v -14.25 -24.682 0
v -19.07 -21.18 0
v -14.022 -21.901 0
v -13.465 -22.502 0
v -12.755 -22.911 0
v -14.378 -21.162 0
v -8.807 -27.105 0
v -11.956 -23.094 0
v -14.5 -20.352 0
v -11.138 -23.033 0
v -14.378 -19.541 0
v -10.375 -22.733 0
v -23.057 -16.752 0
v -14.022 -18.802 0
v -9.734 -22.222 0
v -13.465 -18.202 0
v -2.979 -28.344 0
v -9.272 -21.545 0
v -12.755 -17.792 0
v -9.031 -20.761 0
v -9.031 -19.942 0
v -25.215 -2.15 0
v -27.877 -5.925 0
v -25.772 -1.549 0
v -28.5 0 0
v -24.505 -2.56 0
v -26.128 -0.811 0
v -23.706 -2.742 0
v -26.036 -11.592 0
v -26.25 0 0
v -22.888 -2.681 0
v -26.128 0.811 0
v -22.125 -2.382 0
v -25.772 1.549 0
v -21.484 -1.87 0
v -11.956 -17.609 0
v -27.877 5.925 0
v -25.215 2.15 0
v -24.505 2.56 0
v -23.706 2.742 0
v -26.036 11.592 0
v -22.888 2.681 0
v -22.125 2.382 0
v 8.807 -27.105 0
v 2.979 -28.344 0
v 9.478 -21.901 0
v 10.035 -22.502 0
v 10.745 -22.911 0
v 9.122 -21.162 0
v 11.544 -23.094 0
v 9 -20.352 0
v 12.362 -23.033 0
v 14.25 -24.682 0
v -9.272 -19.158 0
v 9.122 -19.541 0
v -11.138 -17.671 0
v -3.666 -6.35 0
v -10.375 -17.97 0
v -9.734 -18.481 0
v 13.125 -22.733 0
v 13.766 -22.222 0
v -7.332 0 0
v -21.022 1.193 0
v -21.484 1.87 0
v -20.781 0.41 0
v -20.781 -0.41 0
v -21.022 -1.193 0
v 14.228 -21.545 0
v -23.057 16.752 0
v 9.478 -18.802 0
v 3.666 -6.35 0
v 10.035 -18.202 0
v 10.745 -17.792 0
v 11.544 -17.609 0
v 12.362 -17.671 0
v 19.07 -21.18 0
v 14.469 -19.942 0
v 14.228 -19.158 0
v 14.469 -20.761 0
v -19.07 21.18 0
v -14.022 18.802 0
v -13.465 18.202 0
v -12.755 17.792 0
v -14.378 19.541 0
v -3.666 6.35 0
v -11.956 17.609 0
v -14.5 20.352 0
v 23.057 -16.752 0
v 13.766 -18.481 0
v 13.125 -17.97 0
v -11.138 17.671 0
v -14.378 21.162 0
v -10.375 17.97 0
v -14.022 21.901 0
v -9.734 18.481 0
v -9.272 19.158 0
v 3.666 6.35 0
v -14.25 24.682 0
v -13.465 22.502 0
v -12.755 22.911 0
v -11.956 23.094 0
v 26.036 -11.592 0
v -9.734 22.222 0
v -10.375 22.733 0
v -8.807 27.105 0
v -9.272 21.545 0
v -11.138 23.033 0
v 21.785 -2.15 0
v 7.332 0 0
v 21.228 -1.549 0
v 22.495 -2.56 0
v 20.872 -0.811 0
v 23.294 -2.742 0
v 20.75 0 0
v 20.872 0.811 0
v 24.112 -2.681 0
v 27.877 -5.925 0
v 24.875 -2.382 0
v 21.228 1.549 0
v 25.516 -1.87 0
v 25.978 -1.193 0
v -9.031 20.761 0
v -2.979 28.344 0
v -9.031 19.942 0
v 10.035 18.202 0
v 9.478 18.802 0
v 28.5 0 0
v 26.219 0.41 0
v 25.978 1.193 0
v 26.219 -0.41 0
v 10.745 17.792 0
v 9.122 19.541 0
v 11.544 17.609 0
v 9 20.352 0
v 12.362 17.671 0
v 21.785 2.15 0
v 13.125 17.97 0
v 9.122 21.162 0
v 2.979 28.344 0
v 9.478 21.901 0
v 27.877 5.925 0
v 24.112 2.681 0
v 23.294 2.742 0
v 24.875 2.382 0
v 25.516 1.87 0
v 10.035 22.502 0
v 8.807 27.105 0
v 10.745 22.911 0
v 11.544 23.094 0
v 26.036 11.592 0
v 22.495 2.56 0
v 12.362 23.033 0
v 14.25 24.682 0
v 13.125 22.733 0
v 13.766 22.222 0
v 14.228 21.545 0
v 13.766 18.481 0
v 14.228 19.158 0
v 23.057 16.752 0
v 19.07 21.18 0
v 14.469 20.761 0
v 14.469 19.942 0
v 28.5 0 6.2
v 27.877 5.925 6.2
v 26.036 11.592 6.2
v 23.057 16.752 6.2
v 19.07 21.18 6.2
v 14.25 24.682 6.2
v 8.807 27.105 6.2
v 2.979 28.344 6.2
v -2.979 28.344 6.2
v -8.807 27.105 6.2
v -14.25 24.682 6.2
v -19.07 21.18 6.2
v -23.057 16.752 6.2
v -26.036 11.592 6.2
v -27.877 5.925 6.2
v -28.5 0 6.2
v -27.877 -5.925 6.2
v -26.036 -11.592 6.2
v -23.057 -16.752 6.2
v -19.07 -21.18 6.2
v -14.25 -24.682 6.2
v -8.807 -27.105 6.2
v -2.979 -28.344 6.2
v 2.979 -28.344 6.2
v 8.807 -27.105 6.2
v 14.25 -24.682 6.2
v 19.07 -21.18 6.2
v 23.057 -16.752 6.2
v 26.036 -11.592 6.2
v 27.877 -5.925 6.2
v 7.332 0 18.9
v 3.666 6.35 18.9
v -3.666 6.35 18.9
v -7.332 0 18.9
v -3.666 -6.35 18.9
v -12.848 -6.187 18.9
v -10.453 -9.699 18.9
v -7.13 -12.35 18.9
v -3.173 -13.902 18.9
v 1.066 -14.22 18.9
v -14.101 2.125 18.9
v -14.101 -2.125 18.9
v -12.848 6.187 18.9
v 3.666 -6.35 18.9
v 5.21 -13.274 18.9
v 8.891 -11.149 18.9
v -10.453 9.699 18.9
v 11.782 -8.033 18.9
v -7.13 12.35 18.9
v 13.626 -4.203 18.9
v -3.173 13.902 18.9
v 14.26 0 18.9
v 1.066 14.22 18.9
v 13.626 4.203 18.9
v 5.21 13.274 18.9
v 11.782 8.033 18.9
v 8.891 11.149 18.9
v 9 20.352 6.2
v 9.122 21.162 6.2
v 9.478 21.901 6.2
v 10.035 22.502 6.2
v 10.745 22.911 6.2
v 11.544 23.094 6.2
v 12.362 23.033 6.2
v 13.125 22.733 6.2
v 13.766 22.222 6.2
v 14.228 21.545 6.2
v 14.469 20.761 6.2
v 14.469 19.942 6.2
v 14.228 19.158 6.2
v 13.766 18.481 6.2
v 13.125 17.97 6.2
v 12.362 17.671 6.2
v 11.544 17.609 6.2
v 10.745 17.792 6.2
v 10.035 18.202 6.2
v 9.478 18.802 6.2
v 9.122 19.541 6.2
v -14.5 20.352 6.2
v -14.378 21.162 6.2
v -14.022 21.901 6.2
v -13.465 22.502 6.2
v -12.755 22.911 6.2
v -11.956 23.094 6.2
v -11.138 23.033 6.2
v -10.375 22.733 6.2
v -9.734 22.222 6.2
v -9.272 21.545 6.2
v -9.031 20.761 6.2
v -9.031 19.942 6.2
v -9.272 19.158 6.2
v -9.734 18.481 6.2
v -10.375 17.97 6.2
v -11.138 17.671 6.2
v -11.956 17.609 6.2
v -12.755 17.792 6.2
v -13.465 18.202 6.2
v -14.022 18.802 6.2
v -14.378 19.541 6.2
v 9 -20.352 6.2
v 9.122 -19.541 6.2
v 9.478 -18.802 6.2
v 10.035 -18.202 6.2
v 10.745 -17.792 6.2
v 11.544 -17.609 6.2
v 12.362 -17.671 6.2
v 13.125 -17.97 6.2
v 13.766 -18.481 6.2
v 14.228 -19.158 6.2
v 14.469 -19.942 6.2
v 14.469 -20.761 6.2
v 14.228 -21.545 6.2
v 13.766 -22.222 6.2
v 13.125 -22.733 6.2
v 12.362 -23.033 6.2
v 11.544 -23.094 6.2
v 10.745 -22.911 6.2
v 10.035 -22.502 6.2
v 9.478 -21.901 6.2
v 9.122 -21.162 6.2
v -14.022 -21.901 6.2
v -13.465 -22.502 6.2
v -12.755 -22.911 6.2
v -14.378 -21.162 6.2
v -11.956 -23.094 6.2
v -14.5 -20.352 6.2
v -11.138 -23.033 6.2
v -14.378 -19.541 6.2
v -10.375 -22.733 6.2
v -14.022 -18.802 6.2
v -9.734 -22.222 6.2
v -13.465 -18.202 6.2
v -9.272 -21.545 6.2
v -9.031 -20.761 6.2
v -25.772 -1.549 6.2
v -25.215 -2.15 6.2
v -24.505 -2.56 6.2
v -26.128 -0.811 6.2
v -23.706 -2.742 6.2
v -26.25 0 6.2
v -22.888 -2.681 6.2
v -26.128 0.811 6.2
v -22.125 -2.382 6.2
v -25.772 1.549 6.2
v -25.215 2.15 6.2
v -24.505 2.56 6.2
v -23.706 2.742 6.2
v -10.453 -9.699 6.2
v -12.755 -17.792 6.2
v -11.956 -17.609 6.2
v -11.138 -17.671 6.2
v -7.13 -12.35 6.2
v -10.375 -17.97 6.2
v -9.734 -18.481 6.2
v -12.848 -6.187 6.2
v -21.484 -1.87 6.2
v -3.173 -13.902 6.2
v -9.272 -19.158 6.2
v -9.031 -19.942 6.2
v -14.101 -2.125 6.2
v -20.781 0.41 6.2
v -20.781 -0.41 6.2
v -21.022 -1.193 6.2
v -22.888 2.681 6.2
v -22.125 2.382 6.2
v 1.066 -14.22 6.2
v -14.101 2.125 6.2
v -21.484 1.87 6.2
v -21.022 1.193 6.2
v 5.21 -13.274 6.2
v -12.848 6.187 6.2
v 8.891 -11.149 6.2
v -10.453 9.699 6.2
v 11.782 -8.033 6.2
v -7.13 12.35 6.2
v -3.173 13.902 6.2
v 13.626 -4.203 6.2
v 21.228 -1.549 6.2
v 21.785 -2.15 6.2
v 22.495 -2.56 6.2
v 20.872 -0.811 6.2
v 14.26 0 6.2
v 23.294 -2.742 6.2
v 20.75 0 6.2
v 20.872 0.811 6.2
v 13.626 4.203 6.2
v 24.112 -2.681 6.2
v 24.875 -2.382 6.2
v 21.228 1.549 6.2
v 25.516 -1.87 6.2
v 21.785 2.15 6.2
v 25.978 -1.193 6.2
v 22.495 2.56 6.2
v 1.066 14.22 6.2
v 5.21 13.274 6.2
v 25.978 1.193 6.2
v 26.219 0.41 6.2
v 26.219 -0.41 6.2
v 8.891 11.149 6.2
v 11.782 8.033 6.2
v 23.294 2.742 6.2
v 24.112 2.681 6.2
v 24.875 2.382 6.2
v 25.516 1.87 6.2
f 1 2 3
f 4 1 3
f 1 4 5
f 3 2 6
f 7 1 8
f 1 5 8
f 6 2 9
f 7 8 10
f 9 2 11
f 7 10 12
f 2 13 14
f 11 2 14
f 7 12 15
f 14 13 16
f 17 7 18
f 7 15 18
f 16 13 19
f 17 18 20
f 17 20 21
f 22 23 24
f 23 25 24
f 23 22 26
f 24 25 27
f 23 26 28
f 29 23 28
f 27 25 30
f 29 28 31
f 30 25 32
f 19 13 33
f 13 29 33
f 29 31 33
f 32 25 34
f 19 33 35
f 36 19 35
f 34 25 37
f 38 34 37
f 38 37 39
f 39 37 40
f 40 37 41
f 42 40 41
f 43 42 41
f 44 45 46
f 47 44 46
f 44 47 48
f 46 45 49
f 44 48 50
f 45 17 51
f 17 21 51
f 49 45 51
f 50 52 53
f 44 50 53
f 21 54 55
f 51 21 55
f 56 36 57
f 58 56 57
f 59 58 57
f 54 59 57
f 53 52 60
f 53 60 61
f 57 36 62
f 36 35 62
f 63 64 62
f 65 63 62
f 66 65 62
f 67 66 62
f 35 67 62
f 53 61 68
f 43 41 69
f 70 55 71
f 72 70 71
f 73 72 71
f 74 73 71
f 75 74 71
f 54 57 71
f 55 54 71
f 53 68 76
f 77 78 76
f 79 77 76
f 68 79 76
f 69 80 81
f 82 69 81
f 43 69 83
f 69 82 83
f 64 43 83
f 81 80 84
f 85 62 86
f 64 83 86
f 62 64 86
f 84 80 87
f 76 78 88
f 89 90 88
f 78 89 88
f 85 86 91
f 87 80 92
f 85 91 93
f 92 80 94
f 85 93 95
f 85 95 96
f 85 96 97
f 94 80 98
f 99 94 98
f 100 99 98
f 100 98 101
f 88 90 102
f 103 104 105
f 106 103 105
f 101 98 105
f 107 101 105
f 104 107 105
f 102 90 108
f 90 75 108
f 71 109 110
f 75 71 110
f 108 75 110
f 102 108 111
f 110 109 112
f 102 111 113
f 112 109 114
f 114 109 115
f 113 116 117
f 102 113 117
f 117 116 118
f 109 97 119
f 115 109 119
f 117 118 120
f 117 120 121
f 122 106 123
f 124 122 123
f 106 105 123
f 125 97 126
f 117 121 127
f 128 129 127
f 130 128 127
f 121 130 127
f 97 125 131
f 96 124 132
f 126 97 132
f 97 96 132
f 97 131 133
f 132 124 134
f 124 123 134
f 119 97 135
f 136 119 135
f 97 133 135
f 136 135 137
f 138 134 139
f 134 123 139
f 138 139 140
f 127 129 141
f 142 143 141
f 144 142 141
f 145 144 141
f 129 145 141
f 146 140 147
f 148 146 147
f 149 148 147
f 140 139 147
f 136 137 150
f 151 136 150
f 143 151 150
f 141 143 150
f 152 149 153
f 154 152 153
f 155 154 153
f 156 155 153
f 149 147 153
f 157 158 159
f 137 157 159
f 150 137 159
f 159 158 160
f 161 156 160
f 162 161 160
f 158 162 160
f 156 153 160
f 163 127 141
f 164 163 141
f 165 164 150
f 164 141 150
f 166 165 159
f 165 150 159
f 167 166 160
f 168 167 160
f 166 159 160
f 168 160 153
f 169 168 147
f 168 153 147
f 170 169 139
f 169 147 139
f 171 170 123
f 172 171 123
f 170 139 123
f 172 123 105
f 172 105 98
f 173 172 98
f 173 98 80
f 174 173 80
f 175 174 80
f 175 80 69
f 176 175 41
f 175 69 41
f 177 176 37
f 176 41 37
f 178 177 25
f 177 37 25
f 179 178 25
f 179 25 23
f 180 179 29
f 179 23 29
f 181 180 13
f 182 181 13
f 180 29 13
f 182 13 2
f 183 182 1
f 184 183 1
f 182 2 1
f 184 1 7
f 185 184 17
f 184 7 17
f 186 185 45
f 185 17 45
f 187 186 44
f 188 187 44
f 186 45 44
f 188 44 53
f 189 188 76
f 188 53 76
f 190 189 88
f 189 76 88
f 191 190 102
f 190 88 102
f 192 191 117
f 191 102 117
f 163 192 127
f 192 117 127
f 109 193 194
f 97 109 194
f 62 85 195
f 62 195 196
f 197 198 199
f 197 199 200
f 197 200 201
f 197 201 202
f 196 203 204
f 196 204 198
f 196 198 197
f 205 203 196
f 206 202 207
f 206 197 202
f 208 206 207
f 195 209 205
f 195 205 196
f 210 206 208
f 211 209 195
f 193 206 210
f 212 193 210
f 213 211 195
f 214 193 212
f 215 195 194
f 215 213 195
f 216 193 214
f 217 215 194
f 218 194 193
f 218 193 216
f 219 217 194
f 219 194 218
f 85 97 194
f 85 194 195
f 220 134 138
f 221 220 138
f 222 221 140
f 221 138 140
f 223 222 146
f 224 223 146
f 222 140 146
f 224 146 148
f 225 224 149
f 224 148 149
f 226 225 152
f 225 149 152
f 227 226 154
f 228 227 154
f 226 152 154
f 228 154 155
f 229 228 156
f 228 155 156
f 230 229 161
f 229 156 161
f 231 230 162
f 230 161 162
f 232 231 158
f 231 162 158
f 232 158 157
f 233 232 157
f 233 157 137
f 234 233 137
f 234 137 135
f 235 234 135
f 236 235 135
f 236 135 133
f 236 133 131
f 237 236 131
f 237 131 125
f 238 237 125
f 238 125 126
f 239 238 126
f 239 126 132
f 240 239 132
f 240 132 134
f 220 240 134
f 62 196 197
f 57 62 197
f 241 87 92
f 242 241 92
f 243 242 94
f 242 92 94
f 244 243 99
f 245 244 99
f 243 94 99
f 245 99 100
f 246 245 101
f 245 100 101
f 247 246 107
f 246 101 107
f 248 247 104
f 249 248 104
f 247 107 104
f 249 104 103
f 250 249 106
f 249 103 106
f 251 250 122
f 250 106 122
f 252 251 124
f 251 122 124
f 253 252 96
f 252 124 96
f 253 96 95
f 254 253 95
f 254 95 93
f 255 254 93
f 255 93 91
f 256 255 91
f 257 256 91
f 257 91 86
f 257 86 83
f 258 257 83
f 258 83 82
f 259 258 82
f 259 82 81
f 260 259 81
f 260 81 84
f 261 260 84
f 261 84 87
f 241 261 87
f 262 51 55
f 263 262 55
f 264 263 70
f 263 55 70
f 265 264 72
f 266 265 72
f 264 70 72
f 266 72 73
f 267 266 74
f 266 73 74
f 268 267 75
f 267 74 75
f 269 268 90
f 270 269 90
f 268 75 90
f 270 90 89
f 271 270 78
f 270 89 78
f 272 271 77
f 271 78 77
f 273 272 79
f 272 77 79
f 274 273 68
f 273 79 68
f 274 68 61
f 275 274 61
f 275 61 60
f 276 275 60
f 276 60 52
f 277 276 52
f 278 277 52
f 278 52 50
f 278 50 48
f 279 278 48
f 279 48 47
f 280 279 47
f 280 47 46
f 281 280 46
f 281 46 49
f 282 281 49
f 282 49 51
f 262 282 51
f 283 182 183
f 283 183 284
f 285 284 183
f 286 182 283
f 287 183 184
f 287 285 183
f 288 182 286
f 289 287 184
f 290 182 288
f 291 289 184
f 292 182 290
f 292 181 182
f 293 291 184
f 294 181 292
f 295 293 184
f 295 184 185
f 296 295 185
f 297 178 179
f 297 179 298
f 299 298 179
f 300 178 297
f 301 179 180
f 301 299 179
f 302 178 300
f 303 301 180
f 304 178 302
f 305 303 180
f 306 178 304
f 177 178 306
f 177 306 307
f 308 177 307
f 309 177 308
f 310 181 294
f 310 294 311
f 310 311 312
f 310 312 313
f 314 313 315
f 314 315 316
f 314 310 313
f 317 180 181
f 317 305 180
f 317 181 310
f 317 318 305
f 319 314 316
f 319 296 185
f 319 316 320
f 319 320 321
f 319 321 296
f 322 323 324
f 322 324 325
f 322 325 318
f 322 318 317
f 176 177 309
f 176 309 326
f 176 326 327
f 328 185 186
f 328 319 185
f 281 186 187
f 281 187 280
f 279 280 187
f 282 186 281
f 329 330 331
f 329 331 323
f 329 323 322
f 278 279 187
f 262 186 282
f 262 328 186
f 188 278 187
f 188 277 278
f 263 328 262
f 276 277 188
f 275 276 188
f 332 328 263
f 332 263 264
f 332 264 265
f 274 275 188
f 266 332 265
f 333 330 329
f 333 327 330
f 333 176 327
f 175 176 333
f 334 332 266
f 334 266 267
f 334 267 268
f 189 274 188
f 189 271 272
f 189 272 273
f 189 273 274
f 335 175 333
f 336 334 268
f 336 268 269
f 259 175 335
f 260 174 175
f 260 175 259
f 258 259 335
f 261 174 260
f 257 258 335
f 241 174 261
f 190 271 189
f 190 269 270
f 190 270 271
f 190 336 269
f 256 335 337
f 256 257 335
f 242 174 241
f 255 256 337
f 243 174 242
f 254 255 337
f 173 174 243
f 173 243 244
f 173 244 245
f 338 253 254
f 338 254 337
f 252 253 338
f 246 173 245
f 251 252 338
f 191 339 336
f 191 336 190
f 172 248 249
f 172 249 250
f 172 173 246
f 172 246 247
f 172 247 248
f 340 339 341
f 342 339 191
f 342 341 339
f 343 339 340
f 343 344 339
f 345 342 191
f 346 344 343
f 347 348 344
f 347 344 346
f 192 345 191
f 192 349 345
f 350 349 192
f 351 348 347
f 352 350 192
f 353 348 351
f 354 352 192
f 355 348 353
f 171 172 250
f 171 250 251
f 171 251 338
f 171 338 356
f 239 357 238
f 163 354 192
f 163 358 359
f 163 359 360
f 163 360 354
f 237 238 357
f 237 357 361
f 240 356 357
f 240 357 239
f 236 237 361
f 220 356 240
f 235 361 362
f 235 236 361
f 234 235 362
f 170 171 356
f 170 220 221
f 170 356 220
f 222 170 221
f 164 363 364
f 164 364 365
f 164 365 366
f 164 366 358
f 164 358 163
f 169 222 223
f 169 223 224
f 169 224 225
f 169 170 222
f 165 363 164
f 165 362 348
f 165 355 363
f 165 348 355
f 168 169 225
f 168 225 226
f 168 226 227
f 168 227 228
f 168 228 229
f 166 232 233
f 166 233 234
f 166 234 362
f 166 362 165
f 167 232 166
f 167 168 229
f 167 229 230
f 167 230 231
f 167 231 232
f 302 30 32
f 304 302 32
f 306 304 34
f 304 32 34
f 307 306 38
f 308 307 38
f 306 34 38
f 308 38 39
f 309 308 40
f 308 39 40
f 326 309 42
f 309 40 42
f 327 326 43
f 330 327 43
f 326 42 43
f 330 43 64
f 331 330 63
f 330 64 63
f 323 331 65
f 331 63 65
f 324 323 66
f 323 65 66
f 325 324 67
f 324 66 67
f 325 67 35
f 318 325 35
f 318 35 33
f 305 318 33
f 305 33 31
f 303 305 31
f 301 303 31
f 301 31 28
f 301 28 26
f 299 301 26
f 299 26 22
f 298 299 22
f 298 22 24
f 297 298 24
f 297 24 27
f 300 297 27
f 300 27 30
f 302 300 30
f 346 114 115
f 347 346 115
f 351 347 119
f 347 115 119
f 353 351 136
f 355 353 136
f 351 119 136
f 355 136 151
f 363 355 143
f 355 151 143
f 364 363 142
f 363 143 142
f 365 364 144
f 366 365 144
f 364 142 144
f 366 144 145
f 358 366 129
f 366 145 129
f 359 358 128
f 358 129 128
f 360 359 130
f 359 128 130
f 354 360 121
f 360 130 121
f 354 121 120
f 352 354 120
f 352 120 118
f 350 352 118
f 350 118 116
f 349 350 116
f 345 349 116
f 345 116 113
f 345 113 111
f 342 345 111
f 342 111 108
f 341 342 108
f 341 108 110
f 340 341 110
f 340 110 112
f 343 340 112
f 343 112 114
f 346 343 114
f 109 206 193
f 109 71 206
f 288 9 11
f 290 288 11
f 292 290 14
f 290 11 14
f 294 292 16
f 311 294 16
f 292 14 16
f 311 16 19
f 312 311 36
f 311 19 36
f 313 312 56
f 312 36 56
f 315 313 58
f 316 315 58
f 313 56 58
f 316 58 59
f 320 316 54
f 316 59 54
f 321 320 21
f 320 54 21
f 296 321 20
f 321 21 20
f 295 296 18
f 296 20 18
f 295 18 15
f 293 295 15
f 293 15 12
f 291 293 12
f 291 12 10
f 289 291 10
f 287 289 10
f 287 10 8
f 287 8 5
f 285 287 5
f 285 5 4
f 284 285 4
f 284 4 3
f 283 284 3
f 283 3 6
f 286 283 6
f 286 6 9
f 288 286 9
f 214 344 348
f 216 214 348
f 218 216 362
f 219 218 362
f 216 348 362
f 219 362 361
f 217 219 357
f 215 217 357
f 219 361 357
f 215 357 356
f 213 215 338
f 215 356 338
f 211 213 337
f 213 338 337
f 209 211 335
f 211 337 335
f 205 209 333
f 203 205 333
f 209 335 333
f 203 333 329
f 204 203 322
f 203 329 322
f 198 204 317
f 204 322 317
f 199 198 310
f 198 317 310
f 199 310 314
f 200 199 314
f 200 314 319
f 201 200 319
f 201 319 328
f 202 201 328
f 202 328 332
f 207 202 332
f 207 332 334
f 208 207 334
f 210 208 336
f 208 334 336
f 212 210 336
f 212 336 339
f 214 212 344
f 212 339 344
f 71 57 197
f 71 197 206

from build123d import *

# Parameters (mm, degrees)
SKETCH1_R           = 28.5
BOSS_EXTRUDE1_DEPTH = 6.2
SKETCH2_R           = 14.26
BOSS_EXTRUDE2_DEPTH = 12.7
SKETCH3_R           = 2.75
CUT_EXTRUDE1_DEPTH  = 19.9


with BuildPart() as part:
    # Sketch1 → Boss-Extrude1 (new body)
    with BuildSketch(Plane.XY):
        Circle(SKETCH1_R)
        Polygon((7.332348419, 0), (3.666174209, 6.35), (-3.666174209, 6.35), (-7.332348419, 0), (-3.666174209, -6.35), (3.666174209, -6.35), align=None, mode=Mode.SUBTRACT)
    extrude(amount=BOSS_EXTRUDE1_DEPTH)

    # Sketch2 → Boss-Extrude2 (add)
    with BuildSketch(Plane.XY.offset(6.2)):
        Circle(SKETCH2_R)
        Polygon((3.666174209, -6.35), (7.332348419, 0), (3.666174209, 6.35), (-3.666174209, 6.35), (-7.332348419, 0), (-3.666174209, -6.35), align=None, mode=Mode.SUBTRACT)
    extrude(amount=BOSS_EXTRUDE2_DEPTH)

    # Sketch3 → Cut-Extrude1 (cut, through all)
    with BuildSketch(Plane(origin=(0, 0, 0), x_dir=(-1, 0, 0), z_dir=(0, 0, -1))):
        with Locations((-11.75, 20.351596989)):
            Circle(SKETCH3_R)
        with Locations((11.75, 20.351596989)):
            Circle(SKETCH3_R)
        with Locations((23.5, 0)):
            Circle(SKETCH3_R)
        with Locations((11.75, -20.351596989)):
            Circle(SKETCH3_R)
        with Locations((-11.75, -20.351596989)):
            Circle(SKETCH3_R)
        with Locations((-23.5, 0)):
            Circle(SKETCH3_R)
    extrude(amount=-CUT_EXTRUDE1_DEPTH, mode=Mode.SUBTRACT)


solid = part.part
